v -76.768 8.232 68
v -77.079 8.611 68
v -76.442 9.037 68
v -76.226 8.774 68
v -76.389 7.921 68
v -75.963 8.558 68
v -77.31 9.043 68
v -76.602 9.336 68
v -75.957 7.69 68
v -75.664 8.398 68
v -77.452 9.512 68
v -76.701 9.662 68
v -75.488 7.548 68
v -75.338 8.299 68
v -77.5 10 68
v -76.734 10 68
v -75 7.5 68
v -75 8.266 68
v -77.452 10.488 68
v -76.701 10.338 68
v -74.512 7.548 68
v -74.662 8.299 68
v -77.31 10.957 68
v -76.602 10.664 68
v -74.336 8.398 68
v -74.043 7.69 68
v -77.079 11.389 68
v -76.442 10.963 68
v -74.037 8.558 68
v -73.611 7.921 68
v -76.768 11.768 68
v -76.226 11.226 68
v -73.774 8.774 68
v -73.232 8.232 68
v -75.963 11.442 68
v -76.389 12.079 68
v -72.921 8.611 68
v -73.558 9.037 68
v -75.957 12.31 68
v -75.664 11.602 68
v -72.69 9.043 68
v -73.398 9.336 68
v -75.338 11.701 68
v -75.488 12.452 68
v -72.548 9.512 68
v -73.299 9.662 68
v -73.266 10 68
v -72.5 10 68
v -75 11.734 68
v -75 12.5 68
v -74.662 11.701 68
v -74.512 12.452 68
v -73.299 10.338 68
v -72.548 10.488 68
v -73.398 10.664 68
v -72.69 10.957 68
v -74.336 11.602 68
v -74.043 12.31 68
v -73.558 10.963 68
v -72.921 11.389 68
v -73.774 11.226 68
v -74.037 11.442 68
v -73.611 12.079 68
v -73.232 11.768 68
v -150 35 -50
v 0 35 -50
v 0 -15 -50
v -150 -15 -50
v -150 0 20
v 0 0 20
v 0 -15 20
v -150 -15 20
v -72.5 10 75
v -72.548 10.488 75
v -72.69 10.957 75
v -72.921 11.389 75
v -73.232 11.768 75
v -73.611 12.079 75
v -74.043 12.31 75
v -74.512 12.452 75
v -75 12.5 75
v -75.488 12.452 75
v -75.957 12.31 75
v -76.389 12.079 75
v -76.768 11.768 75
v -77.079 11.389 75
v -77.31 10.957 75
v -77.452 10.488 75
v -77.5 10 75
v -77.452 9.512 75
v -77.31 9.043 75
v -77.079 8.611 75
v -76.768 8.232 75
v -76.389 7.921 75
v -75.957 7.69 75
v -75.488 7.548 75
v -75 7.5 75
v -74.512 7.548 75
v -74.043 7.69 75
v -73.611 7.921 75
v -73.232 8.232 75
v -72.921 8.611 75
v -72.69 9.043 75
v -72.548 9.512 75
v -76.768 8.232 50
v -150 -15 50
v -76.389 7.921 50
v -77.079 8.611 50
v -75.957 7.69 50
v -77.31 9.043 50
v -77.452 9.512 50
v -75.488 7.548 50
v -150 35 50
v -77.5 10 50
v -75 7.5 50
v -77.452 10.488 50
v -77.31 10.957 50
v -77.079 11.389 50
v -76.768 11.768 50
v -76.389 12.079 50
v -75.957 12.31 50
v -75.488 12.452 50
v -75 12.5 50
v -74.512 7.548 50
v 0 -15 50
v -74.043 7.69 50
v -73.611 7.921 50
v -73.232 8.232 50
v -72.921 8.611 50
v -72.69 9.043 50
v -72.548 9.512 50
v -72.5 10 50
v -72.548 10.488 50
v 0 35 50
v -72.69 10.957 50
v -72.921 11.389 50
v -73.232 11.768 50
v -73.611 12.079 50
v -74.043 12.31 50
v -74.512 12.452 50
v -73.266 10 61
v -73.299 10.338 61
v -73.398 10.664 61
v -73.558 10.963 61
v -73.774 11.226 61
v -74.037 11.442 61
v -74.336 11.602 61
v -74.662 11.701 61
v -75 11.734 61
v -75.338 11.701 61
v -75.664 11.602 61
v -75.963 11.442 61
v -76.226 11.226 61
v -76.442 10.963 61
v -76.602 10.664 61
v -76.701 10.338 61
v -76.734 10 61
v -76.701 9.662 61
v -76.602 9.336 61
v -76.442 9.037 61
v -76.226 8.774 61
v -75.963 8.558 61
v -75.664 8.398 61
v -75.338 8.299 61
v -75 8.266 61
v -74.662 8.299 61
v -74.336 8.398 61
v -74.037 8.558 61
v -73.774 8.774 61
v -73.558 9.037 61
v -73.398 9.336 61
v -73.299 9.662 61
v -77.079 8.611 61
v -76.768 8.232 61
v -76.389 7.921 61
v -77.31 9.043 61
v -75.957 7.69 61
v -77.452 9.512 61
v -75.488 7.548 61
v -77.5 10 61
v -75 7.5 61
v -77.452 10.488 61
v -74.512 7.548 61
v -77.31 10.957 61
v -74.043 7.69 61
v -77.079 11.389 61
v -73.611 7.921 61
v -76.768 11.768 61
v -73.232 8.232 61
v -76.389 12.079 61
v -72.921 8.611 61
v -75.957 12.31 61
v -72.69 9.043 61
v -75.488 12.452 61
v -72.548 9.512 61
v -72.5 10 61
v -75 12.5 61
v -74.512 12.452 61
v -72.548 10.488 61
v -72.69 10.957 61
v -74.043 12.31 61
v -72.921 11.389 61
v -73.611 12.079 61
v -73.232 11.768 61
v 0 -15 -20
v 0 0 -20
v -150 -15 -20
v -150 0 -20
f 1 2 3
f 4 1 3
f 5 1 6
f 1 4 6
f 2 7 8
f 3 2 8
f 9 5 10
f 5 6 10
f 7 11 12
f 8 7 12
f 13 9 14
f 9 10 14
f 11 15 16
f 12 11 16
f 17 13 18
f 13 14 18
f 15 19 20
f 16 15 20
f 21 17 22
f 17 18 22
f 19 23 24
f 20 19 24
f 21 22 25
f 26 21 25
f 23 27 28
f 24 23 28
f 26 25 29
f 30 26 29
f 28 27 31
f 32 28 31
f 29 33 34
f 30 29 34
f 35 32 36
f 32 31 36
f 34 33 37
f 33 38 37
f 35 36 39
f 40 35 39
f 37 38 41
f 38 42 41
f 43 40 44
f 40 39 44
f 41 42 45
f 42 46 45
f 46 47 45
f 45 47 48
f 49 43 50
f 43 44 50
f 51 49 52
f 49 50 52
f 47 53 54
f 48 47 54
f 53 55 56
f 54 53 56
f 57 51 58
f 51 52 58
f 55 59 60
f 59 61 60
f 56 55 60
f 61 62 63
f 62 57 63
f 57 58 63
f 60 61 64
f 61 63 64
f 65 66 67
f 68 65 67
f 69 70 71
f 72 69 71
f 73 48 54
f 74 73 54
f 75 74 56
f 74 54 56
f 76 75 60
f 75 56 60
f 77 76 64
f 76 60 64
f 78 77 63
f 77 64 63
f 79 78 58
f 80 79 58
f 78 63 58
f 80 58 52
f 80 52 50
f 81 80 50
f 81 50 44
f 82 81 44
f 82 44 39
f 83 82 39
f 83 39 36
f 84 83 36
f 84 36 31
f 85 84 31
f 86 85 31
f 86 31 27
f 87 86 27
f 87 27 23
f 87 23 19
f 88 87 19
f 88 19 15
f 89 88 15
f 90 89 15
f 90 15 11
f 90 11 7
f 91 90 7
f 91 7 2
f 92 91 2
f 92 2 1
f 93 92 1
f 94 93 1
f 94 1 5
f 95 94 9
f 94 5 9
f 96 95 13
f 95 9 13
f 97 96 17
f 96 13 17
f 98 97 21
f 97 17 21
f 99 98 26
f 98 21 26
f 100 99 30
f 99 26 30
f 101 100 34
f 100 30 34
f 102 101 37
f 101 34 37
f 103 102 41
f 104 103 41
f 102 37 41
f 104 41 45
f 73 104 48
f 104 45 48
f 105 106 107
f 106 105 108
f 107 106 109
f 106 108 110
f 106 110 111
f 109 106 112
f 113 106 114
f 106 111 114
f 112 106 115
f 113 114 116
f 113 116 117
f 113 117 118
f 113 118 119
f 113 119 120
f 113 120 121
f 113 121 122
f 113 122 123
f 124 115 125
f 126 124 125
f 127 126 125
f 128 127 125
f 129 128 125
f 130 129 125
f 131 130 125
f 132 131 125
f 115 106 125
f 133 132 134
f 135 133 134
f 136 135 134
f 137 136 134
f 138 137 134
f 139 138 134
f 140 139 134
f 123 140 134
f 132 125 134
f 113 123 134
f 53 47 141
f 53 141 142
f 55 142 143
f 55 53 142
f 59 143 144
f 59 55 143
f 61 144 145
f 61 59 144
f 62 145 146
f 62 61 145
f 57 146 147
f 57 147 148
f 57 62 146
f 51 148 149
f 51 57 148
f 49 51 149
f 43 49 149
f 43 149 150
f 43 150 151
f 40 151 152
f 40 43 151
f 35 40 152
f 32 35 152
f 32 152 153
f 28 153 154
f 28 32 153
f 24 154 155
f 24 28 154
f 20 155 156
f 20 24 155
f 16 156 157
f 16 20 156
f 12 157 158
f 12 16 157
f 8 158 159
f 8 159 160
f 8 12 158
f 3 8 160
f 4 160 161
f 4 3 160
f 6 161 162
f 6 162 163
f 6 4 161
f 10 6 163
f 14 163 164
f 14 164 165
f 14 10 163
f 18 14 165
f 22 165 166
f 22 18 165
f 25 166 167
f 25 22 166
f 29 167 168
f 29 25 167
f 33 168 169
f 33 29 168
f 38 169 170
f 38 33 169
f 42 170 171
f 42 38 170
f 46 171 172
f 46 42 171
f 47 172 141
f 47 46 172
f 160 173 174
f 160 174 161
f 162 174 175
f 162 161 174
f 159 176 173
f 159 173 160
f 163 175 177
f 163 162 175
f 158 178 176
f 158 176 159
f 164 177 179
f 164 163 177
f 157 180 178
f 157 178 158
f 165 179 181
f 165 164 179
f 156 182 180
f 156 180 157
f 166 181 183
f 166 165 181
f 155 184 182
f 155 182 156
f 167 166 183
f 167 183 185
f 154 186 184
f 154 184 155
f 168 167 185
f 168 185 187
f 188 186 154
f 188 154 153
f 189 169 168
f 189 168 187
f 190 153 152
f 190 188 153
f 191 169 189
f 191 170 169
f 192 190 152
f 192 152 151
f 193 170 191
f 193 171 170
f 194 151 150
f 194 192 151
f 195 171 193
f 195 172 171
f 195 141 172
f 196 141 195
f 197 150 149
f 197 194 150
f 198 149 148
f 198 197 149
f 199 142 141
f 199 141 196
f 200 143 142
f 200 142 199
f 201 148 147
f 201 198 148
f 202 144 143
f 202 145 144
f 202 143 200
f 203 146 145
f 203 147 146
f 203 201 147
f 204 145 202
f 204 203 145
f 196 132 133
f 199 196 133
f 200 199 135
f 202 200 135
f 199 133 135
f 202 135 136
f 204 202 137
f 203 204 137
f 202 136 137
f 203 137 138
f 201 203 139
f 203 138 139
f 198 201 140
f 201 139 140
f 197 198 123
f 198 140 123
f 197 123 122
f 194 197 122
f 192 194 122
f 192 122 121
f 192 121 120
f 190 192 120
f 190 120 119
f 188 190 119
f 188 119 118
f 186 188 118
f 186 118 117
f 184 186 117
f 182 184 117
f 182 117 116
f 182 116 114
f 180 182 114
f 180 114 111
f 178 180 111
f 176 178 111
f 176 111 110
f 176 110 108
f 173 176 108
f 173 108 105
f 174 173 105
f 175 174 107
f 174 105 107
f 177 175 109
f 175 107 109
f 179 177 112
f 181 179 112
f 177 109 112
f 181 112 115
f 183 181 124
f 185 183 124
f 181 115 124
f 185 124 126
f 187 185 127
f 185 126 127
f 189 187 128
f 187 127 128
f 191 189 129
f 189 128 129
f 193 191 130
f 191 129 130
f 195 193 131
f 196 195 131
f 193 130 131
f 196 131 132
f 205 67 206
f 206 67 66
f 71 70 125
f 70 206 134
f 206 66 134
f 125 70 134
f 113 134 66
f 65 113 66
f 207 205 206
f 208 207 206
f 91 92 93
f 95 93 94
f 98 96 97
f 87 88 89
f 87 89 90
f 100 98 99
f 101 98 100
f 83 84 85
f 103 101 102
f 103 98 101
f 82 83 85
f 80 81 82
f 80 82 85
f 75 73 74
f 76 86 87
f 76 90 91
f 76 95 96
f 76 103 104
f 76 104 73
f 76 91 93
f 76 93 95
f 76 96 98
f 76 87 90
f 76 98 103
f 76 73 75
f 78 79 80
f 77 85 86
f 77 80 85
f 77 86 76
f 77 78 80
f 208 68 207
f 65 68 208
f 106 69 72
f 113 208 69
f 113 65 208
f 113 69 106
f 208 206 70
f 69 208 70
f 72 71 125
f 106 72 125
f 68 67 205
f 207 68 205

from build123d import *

# Parameters (mm, degrees)
BOSS_EXTRUDE1_DEPTH = 150
SKETCH2_R           = 2.5
BOSS_EXTRUDE2_DEPTH = 25
CUT_EXTRUDE1_START  = -7
SKETCH3_R           = 2.5
SKETCH3_R_2         = 1.733910687
CUT_EXTRUDE1_DEPTH  = 7


with BuildPart() as part:
    # Sketch1 → Boss-Extrude1 (new body)
    with BuildSketch(Plane(origin=(0, 0, 0), x_dir=(0, 0, -1), z_dir=(1, 0, 0))):
        Polygon((-50, 35), (50, 35), (50, -15), (20, -15), (20, 0), (-20, 0), (-20, -15), (-50, -15), align=None)
    extrude(amount=-BOSS_EXTRUDE1_DEPTH)

    # Sketch2 → Boss-Extrude2 (add)
    with BuildSketch(Plane.XY.offset(50)):
        with Locations((-75, 10)):
            Circle(SKETCH2_R)
    extrude(amount=BOSS_EXTRUDE2_DEPTH)

    # Sketch3 → Cut-Extrude1 (cut)
    with BuildSketch(Plane.XY.offset(75).offset(CUT_EXTRUDE1_START)):
        with Locations((-75, 10)):
            Circle(SKETCH3_R)
        with Locations((-75, 10)):
            Circle(SKETCH3_R_2, mode=Mode.SUBTRACT)
    extrude(amount=-CUT_EXTRUDE1_DEPTH, mode=Mode.SUBTRACT)


solid = part.part
